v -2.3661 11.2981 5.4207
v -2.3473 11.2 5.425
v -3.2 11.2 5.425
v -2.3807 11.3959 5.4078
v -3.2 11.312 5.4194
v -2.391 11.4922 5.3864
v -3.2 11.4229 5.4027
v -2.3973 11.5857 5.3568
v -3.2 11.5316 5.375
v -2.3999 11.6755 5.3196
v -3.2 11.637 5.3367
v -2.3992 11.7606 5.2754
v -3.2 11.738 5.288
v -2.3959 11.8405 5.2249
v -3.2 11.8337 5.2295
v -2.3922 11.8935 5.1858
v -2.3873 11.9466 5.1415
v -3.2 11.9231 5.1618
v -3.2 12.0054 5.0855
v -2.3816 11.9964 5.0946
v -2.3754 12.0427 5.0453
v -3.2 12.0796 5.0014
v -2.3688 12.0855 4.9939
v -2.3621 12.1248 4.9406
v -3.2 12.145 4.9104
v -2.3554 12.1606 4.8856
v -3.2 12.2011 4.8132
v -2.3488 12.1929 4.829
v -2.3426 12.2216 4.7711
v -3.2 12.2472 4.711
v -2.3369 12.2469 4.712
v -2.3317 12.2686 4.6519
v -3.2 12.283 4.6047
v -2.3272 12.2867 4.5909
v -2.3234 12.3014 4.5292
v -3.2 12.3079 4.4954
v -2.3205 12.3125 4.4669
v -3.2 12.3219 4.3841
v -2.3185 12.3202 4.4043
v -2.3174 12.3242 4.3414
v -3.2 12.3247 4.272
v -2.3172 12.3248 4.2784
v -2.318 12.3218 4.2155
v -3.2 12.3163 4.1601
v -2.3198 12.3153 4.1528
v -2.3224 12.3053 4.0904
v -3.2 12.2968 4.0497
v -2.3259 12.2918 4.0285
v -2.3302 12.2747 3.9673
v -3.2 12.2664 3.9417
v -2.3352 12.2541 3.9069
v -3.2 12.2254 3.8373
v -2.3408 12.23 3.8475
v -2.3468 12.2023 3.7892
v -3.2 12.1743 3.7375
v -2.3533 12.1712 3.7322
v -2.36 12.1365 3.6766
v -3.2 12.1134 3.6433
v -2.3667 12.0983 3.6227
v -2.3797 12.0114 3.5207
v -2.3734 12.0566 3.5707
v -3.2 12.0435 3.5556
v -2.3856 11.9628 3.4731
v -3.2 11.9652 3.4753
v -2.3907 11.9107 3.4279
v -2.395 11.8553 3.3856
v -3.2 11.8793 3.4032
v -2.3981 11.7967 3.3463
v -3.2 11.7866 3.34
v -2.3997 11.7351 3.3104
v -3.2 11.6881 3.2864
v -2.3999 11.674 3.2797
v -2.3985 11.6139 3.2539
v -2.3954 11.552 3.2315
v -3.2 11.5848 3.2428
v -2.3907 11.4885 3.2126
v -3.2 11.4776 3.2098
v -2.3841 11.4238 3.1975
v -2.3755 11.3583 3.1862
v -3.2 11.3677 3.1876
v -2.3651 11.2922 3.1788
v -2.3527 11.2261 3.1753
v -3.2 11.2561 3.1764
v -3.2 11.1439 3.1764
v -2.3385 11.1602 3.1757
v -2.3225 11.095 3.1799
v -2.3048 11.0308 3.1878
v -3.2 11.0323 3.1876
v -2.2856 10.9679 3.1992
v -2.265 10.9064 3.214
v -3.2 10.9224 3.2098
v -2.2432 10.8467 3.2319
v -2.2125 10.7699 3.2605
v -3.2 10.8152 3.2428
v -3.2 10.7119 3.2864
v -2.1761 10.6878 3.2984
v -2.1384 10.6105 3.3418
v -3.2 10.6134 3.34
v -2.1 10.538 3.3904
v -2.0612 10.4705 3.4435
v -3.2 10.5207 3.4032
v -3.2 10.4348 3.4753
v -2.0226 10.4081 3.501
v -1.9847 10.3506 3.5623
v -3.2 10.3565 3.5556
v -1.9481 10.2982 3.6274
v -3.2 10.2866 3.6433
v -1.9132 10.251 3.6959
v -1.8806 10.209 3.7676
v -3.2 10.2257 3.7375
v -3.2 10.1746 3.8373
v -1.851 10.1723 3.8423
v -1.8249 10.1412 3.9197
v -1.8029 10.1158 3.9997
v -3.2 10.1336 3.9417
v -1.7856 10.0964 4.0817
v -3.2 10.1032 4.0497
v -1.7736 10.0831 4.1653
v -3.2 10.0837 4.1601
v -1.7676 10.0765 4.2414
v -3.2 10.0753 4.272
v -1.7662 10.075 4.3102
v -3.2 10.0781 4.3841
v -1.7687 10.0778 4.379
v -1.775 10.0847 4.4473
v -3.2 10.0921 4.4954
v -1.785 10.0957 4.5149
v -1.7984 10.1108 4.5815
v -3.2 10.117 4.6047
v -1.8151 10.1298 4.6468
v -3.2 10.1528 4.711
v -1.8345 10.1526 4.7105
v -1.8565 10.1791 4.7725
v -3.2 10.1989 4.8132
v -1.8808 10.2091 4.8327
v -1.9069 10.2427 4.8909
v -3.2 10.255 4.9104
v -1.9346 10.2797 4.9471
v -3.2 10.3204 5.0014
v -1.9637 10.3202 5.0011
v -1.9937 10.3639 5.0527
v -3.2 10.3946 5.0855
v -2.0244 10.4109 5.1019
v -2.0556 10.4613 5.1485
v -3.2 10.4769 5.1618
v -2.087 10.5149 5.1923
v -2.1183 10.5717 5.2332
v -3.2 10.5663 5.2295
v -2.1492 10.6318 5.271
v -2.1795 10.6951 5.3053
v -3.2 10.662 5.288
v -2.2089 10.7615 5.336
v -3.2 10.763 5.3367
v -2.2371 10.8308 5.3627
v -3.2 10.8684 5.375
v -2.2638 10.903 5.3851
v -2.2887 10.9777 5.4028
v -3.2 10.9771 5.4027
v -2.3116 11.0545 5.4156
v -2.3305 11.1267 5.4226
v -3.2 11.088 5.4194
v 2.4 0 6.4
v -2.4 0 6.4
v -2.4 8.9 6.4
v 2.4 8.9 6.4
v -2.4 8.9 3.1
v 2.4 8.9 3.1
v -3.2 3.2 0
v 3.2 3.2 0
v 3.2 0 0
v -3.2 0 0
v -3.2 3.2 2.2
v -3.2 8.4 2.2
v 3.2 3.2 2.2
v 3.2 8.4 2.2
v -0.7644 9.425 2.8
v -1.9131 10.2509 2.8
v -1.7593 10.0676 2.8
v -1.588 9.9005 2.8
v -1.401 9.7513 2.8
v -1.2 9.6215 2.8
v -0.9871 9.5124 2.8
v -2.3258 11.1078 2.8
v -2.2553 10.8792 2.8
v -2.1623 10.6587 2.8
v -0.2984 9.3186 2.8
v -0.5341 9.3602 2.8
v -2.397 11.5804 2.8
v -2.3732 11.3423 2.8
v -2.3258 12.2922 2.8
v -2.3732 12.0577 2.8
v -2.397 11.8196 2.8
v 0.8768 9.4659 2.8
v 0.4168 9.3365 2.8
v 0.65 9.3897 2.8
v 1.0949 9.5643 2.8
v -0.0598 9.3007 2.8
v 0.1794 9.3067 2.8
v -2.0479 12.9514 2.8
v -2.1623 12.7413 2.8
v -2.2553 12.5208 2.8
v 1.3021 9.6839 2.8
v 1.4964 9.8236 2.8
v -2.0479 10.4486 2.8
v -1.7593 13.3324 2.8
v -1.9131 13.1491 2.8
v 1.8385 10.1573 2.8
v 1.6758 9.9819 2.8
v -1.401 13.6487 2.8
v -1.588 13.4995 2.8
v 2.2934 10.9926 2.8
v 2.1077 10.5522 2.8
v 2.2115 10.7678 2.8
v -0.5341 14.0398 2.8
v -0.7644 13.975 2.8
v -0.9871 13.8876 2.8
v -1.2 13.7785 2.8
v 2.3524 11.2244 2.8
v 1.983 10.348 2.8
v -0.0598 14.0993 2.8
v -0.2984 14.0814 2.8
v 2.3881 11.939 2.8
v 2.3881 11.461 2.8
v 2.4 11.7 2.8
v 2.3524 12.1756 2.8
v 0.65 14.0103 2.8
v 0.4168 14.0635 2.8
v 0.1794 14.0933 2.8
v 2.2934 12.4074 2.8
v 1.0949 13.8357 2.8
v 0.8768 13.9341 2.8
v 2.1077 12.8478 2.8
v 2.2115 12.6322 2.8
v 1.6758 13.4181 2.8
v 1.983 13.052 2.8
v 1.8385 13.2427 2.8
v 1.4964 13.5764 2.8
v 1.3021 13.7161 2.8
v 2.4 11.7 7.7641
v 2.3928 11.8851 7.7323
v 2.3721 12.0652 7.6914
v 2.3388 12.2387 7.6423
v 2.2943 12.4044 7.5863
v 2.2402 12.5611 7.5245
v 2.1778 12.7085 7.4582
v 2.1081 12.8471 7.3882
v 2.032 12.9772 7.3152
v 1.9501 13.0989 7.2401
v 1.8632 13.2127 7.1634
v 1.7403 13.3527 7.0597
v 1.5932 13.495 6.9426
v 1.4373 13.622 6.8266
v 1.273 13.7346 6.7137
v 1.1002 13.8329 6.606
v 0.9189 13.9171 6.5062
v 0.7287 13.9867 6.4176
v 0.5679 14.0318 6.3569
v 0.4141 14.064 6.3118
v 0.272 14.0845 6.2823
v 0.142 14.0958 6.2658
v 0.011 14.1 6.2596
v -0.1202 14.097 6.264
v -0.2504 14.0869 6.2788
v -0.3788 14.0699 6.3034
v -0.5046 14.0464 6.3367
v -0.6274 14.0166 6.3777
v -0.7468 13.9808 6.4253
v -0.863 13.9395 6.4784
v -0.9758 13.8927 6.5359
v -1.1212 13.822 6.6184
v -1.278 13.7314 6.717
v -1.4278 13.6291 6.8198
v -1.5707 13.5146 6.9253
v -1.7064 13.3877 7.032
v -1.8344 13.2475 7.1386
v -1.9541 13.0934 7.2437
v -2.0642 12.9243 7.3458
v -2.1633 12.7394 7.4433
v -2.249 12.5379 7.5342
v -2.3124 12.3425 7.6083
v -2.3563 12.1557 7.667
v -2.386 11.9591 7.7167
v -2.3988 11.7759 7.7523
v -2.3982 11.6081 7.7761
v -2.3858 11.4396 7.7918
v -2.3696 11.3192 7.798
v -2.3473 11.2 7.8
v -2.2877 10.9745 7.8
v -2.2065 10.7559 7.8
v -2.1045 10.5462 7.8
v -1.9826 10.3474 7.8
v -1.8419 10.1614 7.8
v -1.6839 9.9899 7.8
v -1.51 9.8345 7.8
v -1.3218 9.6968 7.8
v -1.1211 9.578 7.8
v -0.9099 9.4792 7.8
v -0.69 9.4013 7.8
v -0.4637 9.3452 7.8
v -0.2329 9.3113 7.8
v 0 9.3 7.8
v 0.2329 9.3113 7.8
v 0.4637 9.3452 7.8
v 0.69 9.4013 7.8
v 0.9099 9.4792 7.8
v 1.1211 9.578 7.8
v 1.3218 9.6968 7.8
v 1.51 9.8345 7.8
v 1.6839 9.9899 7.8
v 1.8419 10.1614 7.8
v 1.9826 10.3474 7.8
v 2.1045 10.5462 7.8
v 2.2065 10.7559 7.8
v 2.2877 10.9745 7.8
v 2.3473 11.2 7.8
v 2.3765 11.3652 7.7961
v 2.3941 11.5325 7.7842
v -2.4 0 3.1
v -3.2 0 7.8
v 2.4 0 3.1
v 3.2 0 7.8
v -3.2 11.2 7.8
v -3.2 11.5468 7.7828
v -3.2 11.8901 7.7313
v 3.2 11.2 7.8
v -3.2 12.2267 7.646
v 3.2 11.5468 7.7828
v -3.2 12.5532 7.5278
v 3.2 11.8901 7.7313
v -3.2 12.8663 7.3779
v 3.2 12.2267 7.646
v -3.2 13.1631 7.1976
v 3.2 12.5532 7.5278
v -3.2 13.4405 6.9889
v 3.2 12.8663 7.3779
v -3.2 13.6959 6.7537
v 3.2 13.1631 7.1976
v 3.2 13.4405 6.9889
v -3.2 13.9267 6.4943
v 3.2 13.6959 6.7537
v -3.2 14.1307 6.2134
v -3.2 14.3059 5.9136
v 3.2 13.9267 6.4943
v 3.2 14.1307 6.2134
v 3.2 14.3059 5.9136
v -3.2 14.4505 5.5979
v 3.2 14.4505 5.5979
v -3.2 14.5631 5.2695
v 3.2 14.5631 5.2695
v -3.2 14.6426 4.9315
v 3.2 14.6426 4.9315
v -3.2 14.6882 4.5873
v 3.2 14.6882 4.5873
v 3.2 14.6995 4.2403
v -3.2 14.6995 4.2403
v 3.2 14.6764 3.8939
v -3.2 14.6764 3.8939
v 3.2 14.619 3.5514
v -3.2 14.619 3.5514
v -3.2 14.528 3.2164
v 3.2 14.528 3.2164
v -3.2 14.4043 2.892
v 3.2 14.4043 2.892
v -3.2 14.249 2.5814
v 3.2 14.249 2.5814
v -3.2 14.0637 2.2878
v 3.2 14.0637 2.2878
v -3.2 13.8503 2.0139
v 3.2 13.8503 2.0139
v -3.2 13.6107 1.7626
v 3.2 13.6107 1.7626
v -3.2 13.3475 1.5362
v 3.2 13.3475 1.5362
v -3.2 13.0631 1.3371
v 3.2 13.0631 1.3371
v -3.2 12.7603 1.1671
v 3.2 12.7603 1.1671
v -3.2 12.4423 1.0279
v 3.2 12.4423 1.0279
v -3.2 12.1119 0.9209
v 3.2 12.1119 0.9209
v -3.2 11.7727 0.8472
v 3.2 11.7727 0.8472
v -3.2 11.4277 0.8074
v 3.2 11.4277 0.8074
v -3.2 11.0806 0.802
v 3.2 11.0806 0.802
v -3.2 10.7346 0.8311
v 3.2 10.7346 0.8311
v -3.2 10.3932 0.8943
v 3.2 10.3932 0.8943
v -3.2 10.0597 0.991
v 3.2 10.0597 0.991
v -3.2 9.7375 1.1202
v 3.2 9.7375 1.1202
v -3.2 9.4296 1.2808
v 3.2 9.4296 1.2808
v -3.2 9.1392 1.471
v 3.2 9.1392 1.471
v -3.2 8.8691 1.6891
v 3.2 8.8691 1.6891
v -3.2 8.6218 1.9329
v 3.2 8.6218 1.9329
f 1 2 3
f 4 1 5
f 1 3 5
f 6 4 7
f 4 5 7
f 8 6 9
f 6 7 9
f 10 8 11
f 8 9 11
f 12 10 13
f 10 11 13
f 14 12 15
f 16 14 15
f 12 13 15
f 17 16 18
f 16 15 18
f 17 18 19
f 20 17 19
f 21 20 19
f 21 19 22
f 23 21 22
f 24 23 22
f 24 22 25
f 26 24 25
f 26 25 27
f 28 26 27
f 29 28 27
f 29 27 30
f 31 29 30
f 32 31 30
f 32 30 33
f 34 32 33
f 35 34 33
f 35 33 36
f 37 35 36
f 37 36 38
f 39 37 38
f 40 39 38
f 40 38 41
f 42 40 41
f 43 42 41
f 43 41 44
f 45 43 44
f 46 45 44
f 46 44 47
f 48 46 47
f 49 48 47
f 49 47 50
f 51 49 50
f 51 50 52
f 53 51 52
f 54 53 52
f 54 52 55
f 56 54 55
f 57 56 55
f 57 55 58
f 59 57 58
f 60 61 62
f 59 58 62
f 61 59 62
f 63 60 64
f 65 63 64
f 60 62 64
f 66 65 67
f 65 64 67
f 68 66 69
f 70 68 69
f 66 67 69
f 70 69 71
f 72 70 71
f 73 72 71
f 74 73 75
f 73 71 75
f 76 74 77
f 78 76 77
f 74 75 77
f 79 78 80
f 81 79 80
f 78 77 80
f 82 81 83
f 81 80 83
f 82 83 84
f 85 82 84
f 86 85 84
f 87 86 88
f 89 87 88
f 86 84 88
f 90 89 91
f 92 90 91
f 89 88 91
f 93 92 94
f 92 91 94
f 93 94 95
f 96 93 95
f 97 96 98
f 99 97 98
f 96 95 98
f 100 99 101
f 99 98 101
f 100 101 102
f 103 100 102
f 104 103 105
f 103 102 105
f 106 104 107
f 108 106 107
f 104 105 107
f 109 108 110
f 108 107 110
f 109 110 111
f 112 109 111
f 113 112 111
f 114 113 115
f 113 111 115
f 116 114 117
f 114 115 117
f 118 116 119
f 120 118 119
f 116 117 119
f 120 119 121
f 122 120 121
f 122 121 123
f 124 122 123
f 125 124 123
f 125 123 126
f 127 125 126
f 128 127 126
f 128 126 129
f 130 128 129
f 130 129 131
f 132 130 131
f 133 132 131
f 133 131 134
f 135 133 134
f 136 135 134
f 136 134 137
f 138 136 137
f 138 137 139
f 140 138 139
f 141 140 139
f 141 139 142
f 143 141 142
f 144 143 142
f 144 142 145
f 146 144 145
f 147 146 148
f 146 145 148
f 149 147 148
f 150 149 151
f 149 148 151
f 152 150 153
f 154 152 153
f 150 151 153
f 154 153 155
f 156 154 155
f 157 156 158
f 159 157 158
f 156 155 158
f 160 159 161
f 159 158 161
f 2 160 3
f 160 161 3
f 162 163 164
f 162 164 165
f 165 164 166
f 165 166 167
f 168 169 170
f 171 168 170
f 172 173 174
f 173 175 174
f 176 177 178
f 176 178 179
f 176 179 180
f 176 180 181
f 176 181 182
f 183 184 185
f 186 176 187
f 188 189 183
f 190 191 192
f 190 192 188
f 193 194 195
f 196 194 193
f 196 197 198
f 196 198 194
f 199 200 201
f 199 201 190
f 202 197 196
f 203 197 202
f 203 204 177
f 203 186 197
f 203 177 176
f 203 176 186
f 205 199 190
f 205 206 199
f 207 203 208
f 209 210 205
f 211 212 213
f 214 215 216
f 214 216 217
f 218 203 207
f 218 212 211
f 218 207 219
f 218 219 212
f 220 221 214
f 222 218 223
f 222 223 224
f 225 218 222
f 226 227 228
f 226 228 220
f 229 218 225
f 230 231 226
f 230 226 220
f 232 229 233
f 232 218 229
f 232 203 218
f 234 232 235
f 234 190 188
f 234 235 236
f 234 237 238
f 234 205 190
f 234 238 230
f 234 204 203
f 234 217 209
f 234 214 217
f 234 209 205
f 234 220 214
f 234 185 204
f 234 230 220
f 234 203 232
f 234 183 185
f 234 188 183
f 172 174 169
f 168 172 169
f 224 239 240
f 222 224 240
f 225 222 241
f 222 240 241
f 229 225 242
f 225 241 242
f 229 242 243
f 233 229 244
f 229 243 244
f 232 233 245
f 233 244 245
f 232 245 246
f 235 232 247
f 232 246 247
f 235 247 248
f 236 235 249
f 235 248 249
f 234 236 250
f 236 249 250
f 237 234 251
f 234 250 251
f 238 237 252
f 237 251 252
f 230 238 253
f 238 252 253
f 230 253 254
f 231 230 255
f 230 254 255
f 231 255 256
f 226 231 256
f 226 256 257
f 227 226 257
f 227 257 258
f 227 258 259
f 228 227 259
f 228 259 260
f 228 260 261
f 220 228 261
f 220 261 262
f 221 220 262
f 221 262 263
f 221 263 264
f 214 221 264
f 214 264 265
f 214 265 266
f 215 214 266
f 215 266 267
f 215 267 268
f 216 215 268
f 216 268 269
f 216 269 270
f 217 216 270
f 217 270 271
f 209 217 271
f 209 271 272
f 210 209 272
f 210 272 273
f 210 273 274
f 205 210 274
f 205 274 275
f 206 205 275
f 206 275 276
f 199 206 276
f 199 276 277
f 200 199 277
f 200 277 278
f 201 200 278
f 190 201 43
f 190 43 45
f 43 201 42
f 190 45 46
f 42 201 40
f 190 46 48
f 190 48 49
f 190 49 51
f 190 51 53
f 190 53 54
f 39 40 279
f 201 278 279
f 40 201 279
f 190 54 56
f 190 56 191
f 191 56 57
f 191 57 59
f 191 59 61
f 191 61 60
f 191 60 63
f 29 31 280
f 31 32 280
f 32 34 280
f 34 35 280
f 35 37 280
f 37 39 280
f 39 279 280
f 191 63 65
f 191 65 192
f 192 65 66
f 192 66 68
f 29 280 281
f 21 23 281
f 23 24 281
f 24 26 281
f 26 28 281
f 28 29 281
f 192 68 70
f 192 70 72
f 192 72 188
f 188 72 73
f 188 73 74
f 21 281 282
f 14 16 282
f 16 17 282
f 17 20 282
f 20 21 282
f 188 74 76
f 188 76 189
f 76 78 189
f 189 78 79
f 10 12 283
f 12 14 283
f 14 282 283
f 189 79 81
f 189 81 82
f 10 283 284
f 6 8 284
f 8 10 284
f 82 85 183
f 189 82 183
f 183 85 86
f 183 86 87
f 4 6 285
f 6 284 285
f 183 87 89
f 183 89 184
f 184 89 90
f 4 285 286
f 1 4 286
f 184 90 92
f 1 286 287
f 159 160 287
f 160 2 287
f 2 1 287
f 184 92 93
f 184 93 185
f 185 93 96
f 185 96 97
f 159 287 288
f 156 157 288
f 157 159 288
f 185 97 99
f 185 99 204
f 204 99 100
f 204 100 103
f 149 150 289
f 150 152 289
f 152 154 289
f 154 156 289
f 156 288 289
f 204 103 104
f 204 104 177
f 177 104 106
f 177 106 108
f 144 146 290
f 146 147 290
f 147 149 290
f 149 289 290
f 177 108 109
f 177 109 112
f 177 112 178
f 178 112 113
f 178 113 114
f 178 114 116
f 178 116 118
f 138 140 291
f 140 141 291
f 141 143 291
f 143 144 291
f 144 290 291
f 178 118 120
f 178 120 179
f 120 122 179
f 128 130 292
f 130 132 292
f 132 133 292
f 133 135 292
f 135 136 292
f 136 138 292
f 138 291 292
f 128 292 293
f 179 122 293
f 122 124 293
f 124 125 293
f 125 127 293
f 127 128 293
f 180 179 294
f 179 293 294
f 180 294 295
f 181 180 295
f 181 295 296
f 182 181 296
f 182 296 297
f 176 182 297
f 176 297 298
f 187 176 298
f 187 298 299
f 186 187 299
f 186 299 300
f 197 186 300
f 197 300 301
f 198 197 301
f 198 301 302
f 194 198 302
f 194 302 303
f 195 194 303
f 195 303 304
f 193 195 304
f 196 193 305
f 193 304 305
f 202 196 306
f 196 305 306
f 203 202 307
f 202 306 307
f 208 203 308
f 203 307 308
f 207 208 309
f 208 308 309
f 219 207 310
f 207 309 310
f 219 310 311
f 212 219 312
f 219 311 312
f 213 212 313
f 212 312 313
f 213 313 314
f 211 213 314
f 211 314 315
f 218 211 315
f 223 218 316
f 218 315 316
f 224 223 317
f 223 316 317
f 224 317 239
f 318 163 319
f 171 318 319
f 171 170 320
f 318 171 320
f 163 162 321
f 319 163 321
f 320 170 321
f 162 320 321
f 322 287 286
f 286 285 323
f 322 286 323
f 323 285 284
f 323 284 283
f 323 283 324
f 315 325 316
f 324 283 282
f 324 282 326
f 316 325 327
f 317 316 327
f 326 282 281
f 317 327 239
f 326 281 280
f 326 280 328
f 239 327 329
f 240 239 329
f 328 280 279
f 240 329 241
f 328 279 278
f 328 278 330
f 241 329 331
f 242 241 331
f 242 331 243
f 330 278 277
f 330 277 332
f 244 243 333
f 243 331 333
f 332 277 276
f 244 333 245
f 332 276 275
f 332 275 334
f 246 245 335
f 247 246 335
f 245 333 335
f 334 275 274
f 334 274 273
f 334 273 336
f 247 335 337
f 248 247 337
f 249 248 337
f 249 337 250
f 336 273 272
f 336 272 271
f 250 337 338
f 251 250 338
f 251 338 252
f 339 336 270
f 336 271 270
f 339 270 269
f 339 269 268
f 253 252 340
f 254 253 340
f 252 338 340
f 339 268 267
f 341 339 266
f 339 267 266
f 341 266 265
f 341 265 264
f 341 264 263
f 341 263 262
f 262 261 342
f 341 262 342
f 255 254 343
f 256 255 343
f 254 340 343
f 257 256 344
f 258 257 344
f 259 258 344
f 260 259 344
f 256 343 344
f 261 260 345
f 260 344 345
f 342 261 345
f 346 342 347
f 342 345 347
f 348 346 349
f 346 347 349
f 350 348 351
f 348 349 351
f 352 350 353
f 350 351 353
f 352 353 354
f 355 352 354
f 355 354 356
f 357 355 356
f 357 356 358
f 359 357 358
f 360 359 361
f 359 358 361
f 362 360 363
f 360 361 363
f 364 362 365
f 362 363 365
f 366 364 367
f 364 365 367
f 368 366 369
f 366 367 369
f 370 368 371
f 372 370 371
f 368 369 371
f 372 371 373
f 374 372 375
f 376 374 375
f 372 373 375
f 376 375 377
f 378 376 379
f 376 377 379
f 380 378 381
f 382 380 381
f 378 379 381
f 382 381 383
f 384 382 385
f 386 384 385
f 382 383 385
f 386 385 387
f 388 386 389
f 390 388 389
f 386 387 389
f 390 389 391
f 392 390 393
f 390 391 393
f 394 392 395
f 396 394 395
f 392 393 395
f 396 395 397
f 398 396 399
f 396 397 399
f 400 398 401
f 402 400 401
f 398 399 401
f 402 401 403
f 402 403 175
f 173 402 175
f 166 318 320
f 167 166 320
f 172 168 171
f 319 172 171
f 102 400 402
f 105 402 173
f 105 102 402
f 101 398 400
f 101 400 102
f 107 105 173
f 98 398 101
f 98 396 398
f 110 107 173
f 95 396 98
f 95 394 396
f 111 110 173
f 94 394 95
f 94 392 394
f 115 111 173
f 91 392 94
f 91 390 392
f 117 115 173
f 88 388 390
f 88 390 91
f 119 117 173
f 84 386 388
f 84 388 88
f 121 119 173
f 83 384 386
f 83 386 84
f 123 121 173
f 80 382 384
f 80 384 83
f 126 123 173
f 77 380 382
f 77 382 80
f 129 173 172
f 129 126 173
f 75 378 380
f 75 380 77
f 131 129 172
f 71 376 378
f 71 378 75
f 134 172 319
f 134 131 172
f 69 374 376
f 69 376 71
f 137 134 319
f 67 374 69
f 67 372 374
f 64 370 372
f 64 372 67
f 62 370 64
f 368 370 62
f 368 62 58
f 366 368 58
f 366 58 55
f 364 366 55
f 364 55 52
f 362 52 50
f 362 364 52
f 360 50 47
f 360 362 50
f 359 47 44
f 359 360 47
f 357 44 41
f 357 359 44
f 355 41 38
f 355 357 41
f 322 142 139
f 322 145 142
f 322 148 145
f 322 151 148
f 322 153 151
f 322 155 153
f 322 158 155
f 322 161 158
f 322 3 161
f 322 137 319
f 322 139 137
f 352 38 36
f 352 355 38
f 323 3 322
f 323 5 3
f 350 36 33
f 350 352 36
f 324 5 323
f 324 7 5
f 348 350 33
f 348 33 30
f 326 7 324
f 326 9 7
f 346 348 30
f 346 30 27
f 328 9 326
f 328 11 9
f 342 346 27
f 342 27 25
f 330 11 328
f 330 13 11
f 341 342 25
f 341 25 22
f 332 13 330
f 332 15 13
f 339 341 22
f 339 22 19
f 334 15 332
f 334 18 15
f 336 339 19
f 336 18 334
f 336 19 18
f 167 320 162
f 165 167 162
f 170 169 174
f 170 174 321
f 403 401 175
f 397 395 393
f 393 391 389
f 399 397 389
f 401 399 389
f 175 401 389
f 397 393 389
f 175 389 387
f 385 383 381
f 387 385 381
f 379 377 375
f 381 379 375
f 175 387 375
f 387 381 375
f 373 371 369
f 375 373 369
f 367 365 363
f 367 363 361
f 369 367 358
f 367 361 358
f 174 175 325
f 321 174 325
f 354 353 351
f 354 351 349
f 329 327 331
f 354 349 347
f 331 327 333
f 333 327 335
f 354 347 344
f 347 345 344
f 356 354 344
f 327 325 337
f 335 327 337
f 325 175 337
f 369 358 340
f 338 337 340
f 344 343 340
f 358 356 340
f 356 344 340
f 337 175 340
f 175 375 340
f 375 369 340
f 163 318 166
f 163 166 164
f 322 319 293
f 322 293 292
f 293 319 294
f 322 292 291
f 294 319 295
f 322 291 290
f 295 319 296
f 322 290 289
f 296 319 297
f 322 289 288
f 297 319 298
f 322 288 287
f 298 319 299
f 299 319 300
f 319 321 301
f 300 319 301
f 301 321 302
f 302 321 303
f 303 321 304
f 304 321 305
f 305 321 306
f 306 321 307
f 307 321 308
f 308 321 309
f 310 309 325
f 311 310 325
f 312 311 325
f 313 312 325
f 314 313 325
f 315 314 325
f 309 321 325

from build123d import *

# Parameters (mm, degrees)
BOSS_EXTRUDE1_DEPTH = 3.2
SKETCH2_W           = 4.8
SKETCH2_H           = 3.3
CUT_EXTRUDE1_DEPTH  = 8.9
SKETCH3_R           = 1.125
CUT_EXTRUDE2_DEPTH  = 2
SKETCH4_R           = 2.4
CUT_EXTRUDE3_DEPTH  = 5


with BuildPart() as part:
    # Sketch1 → Boss-Extrude1 (new, symmetric)
    with BuildSketch(Plane(origin=(0, 0, 0), x_dir=(0, 0, -1), z_dir=(1, 0, 0))):
        with BuildLine():
            Line((0, 0), (-7.8, 0))
            Line((-7.8, 0), (-7.8, 11.2))
            ThreePointArc((-7.8, 11.2), (-2.734752416, 14.330495168), (-2.2, 8.4))
            Line((-2.2, 8.4), (-2.2, 3.2))
            Line((-2.2, 3.2), (0, 3.2))
            Line((0, 3.2), (0, 0))
        make_face()
    extrude(amount=BOSS_EXTRUDE1_DEPTH, both=True)

    # Sketch2 → Cut-Extrude1 (cut)
    with BuildSketch(Plane.XZ):
        with Locations((0, 4.75)):
            Rectangle(SKETCH2_W, SKETCH2_H)
    extrude(amount=-CUT_EXTRUDE1_DEPTH, mode=Mode.SUBTRACT)

    # Sketch3 → Cut-Extrude2 (cut)
    with BuildSketch(Plane.ZY.offset(3.2)):
        with Locations((4.3, 11.2)):
            Circle(SKETCH3_R)
    extrude(amount=-CUT_EXTRUDE2_DEPTH, mode=Mode.SUBTRACT)

    # Sketch4 → Cut-Extrude3 (cut)
    with BuildSketch(Plane.XY.offset(7.8)):
        with Locations((0, 11.7)):
            Circle(SKETCH4_R)
    extrude(amount=-CUT_EXTRUDE3_DEPTH, mode=Mode.SUBTRACT)


solid = part.part
